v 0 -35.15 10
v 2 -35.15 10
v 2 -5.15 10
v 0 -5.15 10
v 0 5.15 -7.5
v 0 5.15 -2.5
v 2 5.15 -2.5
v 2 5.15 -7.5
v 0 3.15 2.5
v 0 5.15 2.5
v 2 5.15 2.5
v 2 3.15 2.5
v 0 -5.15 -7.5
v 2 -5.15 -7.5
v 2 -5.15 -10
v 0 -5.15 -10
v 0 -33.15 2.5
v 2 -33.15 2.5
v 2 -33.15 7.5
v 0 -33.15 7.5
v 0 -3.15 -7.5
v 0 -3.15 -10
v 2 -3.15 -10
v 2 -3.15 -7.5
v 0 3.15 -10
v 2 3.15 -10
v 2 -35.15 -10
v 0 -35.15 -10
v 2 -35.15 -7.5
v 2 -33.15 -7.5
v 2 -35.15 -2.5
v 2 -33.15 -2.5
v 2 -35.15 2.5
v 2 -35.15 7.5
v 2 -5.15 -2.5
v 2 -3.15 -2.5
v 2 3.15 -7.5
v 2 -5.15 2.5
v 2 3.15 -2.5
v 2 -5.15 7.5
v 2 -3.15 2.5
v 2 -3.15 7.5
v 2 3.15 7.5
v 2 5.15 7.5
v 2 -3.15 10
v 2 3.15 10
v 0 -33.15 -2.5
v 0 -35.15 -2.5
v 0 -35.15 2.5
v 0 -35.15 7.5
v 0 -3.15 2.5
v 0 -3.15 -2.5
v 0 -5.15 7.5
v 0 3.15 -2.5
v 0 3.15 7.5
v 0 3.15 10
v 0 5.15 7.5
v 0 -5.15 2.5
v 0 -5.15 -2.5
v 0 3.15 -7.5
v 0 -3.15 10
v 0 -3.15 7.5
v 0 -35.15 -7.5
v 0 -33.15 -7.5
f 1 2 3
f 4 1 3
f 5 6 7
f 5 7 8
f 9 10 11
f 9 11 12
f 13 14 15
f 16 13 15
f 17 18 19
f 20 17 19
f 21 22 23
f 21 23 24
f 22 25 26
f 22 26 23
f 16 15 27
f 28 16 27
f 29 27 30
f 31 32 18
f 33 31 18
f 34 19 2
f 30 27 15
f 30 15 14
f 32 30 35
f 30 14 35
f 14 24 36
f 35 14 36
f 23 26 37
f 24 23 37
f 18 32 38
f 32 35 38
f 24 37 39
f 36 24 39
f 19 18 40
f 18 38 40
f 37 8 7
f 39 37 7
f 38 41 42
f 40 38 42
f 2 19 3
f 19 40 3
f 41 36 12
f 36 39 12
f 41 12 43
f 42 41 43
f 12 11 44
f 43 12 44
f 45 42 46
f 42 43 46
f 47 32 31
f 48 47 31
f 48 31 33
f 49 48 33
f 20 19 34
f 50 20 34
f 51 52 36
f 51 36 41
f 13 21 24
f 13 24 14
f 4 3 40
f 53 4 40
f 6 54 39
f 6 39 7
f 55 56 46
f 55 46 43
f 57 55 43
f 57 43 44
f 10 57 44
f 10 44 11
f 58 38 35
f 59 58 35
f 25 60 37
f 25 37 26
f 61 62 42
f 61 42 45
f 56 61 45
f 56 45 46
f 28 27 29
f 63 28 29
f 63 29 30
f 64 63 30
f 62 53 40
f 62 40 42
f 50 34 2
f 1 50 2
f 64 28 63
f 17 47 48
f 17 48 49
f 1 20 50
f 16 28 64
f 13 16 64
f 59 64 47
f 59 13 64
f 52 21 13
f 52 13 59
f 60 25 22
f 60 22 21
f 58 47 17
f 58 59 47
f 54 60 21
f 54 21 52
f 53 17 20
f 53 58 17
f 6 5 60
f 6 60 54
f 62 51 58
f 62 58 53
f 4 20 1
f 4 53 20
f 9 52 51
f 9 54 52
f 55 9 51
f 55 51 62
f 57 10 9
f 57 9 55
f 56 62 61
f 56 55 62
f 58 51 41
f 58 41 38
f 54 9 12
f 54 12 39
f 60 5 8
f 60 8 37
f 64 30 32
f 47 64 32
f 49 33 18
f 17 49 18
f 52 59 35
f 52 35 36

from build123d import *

# Parameters (mm, degrees)
BOSS_EXTRUDE1_DEPTH = 2
BOSS_EXTRUDE2_DEPTH = 2


with BuildPart() as part:
    # Sketch1 → Boss-Extrude1 (new body)
    with BuildSketch(Plane(origin=(0, 0, 0), x_dir=(0, 0, -1), z_dir=(1, 0, 0))):
        Polygon((-7.5, 3.15), (-7.5, 5.15), (-2.5, 5.15), (-2.5, 3.15), (2.5, 3.15), (2.5, 5.15), (7.5, 5.15), (7.5, 3.15), (10, 3.15), (10, -3.15), (7.5, -3.15), (7.5, -5.15), (2.5, -5.15), (2.5, -3.15), (-2.5, -3.15), (-2.5, -5.15), (-7.5, -5.15), (-7.5, -3.15), (-10, -3.15), (-10, 3.15), align=None)
    extrude(amount=BOSS_EXTRUDE1_DEPTH)

    # Sketch2 → Boss-Extrude2 (add)
    with BuildSketch(Plane(origin=(2, 0, 0), x_dir=(0, 0, -1), z_dir=(1, 0, 0))):
        Polygon((-10, -5.15), (10, -5.15), (10, -35.15), (7.5, -35.15), (7.5, -33.15), (2.5, -33.15), (2.5, -35.15), (-2.5, -35.15), (-2.5, -33.15), (-7.5, -33.15), (-7.5, -35.15), (-10, -35.15), align=None)
    extrude(amount=-BOSS_EXTRUDE2_DEPTH)


solid = part.part
